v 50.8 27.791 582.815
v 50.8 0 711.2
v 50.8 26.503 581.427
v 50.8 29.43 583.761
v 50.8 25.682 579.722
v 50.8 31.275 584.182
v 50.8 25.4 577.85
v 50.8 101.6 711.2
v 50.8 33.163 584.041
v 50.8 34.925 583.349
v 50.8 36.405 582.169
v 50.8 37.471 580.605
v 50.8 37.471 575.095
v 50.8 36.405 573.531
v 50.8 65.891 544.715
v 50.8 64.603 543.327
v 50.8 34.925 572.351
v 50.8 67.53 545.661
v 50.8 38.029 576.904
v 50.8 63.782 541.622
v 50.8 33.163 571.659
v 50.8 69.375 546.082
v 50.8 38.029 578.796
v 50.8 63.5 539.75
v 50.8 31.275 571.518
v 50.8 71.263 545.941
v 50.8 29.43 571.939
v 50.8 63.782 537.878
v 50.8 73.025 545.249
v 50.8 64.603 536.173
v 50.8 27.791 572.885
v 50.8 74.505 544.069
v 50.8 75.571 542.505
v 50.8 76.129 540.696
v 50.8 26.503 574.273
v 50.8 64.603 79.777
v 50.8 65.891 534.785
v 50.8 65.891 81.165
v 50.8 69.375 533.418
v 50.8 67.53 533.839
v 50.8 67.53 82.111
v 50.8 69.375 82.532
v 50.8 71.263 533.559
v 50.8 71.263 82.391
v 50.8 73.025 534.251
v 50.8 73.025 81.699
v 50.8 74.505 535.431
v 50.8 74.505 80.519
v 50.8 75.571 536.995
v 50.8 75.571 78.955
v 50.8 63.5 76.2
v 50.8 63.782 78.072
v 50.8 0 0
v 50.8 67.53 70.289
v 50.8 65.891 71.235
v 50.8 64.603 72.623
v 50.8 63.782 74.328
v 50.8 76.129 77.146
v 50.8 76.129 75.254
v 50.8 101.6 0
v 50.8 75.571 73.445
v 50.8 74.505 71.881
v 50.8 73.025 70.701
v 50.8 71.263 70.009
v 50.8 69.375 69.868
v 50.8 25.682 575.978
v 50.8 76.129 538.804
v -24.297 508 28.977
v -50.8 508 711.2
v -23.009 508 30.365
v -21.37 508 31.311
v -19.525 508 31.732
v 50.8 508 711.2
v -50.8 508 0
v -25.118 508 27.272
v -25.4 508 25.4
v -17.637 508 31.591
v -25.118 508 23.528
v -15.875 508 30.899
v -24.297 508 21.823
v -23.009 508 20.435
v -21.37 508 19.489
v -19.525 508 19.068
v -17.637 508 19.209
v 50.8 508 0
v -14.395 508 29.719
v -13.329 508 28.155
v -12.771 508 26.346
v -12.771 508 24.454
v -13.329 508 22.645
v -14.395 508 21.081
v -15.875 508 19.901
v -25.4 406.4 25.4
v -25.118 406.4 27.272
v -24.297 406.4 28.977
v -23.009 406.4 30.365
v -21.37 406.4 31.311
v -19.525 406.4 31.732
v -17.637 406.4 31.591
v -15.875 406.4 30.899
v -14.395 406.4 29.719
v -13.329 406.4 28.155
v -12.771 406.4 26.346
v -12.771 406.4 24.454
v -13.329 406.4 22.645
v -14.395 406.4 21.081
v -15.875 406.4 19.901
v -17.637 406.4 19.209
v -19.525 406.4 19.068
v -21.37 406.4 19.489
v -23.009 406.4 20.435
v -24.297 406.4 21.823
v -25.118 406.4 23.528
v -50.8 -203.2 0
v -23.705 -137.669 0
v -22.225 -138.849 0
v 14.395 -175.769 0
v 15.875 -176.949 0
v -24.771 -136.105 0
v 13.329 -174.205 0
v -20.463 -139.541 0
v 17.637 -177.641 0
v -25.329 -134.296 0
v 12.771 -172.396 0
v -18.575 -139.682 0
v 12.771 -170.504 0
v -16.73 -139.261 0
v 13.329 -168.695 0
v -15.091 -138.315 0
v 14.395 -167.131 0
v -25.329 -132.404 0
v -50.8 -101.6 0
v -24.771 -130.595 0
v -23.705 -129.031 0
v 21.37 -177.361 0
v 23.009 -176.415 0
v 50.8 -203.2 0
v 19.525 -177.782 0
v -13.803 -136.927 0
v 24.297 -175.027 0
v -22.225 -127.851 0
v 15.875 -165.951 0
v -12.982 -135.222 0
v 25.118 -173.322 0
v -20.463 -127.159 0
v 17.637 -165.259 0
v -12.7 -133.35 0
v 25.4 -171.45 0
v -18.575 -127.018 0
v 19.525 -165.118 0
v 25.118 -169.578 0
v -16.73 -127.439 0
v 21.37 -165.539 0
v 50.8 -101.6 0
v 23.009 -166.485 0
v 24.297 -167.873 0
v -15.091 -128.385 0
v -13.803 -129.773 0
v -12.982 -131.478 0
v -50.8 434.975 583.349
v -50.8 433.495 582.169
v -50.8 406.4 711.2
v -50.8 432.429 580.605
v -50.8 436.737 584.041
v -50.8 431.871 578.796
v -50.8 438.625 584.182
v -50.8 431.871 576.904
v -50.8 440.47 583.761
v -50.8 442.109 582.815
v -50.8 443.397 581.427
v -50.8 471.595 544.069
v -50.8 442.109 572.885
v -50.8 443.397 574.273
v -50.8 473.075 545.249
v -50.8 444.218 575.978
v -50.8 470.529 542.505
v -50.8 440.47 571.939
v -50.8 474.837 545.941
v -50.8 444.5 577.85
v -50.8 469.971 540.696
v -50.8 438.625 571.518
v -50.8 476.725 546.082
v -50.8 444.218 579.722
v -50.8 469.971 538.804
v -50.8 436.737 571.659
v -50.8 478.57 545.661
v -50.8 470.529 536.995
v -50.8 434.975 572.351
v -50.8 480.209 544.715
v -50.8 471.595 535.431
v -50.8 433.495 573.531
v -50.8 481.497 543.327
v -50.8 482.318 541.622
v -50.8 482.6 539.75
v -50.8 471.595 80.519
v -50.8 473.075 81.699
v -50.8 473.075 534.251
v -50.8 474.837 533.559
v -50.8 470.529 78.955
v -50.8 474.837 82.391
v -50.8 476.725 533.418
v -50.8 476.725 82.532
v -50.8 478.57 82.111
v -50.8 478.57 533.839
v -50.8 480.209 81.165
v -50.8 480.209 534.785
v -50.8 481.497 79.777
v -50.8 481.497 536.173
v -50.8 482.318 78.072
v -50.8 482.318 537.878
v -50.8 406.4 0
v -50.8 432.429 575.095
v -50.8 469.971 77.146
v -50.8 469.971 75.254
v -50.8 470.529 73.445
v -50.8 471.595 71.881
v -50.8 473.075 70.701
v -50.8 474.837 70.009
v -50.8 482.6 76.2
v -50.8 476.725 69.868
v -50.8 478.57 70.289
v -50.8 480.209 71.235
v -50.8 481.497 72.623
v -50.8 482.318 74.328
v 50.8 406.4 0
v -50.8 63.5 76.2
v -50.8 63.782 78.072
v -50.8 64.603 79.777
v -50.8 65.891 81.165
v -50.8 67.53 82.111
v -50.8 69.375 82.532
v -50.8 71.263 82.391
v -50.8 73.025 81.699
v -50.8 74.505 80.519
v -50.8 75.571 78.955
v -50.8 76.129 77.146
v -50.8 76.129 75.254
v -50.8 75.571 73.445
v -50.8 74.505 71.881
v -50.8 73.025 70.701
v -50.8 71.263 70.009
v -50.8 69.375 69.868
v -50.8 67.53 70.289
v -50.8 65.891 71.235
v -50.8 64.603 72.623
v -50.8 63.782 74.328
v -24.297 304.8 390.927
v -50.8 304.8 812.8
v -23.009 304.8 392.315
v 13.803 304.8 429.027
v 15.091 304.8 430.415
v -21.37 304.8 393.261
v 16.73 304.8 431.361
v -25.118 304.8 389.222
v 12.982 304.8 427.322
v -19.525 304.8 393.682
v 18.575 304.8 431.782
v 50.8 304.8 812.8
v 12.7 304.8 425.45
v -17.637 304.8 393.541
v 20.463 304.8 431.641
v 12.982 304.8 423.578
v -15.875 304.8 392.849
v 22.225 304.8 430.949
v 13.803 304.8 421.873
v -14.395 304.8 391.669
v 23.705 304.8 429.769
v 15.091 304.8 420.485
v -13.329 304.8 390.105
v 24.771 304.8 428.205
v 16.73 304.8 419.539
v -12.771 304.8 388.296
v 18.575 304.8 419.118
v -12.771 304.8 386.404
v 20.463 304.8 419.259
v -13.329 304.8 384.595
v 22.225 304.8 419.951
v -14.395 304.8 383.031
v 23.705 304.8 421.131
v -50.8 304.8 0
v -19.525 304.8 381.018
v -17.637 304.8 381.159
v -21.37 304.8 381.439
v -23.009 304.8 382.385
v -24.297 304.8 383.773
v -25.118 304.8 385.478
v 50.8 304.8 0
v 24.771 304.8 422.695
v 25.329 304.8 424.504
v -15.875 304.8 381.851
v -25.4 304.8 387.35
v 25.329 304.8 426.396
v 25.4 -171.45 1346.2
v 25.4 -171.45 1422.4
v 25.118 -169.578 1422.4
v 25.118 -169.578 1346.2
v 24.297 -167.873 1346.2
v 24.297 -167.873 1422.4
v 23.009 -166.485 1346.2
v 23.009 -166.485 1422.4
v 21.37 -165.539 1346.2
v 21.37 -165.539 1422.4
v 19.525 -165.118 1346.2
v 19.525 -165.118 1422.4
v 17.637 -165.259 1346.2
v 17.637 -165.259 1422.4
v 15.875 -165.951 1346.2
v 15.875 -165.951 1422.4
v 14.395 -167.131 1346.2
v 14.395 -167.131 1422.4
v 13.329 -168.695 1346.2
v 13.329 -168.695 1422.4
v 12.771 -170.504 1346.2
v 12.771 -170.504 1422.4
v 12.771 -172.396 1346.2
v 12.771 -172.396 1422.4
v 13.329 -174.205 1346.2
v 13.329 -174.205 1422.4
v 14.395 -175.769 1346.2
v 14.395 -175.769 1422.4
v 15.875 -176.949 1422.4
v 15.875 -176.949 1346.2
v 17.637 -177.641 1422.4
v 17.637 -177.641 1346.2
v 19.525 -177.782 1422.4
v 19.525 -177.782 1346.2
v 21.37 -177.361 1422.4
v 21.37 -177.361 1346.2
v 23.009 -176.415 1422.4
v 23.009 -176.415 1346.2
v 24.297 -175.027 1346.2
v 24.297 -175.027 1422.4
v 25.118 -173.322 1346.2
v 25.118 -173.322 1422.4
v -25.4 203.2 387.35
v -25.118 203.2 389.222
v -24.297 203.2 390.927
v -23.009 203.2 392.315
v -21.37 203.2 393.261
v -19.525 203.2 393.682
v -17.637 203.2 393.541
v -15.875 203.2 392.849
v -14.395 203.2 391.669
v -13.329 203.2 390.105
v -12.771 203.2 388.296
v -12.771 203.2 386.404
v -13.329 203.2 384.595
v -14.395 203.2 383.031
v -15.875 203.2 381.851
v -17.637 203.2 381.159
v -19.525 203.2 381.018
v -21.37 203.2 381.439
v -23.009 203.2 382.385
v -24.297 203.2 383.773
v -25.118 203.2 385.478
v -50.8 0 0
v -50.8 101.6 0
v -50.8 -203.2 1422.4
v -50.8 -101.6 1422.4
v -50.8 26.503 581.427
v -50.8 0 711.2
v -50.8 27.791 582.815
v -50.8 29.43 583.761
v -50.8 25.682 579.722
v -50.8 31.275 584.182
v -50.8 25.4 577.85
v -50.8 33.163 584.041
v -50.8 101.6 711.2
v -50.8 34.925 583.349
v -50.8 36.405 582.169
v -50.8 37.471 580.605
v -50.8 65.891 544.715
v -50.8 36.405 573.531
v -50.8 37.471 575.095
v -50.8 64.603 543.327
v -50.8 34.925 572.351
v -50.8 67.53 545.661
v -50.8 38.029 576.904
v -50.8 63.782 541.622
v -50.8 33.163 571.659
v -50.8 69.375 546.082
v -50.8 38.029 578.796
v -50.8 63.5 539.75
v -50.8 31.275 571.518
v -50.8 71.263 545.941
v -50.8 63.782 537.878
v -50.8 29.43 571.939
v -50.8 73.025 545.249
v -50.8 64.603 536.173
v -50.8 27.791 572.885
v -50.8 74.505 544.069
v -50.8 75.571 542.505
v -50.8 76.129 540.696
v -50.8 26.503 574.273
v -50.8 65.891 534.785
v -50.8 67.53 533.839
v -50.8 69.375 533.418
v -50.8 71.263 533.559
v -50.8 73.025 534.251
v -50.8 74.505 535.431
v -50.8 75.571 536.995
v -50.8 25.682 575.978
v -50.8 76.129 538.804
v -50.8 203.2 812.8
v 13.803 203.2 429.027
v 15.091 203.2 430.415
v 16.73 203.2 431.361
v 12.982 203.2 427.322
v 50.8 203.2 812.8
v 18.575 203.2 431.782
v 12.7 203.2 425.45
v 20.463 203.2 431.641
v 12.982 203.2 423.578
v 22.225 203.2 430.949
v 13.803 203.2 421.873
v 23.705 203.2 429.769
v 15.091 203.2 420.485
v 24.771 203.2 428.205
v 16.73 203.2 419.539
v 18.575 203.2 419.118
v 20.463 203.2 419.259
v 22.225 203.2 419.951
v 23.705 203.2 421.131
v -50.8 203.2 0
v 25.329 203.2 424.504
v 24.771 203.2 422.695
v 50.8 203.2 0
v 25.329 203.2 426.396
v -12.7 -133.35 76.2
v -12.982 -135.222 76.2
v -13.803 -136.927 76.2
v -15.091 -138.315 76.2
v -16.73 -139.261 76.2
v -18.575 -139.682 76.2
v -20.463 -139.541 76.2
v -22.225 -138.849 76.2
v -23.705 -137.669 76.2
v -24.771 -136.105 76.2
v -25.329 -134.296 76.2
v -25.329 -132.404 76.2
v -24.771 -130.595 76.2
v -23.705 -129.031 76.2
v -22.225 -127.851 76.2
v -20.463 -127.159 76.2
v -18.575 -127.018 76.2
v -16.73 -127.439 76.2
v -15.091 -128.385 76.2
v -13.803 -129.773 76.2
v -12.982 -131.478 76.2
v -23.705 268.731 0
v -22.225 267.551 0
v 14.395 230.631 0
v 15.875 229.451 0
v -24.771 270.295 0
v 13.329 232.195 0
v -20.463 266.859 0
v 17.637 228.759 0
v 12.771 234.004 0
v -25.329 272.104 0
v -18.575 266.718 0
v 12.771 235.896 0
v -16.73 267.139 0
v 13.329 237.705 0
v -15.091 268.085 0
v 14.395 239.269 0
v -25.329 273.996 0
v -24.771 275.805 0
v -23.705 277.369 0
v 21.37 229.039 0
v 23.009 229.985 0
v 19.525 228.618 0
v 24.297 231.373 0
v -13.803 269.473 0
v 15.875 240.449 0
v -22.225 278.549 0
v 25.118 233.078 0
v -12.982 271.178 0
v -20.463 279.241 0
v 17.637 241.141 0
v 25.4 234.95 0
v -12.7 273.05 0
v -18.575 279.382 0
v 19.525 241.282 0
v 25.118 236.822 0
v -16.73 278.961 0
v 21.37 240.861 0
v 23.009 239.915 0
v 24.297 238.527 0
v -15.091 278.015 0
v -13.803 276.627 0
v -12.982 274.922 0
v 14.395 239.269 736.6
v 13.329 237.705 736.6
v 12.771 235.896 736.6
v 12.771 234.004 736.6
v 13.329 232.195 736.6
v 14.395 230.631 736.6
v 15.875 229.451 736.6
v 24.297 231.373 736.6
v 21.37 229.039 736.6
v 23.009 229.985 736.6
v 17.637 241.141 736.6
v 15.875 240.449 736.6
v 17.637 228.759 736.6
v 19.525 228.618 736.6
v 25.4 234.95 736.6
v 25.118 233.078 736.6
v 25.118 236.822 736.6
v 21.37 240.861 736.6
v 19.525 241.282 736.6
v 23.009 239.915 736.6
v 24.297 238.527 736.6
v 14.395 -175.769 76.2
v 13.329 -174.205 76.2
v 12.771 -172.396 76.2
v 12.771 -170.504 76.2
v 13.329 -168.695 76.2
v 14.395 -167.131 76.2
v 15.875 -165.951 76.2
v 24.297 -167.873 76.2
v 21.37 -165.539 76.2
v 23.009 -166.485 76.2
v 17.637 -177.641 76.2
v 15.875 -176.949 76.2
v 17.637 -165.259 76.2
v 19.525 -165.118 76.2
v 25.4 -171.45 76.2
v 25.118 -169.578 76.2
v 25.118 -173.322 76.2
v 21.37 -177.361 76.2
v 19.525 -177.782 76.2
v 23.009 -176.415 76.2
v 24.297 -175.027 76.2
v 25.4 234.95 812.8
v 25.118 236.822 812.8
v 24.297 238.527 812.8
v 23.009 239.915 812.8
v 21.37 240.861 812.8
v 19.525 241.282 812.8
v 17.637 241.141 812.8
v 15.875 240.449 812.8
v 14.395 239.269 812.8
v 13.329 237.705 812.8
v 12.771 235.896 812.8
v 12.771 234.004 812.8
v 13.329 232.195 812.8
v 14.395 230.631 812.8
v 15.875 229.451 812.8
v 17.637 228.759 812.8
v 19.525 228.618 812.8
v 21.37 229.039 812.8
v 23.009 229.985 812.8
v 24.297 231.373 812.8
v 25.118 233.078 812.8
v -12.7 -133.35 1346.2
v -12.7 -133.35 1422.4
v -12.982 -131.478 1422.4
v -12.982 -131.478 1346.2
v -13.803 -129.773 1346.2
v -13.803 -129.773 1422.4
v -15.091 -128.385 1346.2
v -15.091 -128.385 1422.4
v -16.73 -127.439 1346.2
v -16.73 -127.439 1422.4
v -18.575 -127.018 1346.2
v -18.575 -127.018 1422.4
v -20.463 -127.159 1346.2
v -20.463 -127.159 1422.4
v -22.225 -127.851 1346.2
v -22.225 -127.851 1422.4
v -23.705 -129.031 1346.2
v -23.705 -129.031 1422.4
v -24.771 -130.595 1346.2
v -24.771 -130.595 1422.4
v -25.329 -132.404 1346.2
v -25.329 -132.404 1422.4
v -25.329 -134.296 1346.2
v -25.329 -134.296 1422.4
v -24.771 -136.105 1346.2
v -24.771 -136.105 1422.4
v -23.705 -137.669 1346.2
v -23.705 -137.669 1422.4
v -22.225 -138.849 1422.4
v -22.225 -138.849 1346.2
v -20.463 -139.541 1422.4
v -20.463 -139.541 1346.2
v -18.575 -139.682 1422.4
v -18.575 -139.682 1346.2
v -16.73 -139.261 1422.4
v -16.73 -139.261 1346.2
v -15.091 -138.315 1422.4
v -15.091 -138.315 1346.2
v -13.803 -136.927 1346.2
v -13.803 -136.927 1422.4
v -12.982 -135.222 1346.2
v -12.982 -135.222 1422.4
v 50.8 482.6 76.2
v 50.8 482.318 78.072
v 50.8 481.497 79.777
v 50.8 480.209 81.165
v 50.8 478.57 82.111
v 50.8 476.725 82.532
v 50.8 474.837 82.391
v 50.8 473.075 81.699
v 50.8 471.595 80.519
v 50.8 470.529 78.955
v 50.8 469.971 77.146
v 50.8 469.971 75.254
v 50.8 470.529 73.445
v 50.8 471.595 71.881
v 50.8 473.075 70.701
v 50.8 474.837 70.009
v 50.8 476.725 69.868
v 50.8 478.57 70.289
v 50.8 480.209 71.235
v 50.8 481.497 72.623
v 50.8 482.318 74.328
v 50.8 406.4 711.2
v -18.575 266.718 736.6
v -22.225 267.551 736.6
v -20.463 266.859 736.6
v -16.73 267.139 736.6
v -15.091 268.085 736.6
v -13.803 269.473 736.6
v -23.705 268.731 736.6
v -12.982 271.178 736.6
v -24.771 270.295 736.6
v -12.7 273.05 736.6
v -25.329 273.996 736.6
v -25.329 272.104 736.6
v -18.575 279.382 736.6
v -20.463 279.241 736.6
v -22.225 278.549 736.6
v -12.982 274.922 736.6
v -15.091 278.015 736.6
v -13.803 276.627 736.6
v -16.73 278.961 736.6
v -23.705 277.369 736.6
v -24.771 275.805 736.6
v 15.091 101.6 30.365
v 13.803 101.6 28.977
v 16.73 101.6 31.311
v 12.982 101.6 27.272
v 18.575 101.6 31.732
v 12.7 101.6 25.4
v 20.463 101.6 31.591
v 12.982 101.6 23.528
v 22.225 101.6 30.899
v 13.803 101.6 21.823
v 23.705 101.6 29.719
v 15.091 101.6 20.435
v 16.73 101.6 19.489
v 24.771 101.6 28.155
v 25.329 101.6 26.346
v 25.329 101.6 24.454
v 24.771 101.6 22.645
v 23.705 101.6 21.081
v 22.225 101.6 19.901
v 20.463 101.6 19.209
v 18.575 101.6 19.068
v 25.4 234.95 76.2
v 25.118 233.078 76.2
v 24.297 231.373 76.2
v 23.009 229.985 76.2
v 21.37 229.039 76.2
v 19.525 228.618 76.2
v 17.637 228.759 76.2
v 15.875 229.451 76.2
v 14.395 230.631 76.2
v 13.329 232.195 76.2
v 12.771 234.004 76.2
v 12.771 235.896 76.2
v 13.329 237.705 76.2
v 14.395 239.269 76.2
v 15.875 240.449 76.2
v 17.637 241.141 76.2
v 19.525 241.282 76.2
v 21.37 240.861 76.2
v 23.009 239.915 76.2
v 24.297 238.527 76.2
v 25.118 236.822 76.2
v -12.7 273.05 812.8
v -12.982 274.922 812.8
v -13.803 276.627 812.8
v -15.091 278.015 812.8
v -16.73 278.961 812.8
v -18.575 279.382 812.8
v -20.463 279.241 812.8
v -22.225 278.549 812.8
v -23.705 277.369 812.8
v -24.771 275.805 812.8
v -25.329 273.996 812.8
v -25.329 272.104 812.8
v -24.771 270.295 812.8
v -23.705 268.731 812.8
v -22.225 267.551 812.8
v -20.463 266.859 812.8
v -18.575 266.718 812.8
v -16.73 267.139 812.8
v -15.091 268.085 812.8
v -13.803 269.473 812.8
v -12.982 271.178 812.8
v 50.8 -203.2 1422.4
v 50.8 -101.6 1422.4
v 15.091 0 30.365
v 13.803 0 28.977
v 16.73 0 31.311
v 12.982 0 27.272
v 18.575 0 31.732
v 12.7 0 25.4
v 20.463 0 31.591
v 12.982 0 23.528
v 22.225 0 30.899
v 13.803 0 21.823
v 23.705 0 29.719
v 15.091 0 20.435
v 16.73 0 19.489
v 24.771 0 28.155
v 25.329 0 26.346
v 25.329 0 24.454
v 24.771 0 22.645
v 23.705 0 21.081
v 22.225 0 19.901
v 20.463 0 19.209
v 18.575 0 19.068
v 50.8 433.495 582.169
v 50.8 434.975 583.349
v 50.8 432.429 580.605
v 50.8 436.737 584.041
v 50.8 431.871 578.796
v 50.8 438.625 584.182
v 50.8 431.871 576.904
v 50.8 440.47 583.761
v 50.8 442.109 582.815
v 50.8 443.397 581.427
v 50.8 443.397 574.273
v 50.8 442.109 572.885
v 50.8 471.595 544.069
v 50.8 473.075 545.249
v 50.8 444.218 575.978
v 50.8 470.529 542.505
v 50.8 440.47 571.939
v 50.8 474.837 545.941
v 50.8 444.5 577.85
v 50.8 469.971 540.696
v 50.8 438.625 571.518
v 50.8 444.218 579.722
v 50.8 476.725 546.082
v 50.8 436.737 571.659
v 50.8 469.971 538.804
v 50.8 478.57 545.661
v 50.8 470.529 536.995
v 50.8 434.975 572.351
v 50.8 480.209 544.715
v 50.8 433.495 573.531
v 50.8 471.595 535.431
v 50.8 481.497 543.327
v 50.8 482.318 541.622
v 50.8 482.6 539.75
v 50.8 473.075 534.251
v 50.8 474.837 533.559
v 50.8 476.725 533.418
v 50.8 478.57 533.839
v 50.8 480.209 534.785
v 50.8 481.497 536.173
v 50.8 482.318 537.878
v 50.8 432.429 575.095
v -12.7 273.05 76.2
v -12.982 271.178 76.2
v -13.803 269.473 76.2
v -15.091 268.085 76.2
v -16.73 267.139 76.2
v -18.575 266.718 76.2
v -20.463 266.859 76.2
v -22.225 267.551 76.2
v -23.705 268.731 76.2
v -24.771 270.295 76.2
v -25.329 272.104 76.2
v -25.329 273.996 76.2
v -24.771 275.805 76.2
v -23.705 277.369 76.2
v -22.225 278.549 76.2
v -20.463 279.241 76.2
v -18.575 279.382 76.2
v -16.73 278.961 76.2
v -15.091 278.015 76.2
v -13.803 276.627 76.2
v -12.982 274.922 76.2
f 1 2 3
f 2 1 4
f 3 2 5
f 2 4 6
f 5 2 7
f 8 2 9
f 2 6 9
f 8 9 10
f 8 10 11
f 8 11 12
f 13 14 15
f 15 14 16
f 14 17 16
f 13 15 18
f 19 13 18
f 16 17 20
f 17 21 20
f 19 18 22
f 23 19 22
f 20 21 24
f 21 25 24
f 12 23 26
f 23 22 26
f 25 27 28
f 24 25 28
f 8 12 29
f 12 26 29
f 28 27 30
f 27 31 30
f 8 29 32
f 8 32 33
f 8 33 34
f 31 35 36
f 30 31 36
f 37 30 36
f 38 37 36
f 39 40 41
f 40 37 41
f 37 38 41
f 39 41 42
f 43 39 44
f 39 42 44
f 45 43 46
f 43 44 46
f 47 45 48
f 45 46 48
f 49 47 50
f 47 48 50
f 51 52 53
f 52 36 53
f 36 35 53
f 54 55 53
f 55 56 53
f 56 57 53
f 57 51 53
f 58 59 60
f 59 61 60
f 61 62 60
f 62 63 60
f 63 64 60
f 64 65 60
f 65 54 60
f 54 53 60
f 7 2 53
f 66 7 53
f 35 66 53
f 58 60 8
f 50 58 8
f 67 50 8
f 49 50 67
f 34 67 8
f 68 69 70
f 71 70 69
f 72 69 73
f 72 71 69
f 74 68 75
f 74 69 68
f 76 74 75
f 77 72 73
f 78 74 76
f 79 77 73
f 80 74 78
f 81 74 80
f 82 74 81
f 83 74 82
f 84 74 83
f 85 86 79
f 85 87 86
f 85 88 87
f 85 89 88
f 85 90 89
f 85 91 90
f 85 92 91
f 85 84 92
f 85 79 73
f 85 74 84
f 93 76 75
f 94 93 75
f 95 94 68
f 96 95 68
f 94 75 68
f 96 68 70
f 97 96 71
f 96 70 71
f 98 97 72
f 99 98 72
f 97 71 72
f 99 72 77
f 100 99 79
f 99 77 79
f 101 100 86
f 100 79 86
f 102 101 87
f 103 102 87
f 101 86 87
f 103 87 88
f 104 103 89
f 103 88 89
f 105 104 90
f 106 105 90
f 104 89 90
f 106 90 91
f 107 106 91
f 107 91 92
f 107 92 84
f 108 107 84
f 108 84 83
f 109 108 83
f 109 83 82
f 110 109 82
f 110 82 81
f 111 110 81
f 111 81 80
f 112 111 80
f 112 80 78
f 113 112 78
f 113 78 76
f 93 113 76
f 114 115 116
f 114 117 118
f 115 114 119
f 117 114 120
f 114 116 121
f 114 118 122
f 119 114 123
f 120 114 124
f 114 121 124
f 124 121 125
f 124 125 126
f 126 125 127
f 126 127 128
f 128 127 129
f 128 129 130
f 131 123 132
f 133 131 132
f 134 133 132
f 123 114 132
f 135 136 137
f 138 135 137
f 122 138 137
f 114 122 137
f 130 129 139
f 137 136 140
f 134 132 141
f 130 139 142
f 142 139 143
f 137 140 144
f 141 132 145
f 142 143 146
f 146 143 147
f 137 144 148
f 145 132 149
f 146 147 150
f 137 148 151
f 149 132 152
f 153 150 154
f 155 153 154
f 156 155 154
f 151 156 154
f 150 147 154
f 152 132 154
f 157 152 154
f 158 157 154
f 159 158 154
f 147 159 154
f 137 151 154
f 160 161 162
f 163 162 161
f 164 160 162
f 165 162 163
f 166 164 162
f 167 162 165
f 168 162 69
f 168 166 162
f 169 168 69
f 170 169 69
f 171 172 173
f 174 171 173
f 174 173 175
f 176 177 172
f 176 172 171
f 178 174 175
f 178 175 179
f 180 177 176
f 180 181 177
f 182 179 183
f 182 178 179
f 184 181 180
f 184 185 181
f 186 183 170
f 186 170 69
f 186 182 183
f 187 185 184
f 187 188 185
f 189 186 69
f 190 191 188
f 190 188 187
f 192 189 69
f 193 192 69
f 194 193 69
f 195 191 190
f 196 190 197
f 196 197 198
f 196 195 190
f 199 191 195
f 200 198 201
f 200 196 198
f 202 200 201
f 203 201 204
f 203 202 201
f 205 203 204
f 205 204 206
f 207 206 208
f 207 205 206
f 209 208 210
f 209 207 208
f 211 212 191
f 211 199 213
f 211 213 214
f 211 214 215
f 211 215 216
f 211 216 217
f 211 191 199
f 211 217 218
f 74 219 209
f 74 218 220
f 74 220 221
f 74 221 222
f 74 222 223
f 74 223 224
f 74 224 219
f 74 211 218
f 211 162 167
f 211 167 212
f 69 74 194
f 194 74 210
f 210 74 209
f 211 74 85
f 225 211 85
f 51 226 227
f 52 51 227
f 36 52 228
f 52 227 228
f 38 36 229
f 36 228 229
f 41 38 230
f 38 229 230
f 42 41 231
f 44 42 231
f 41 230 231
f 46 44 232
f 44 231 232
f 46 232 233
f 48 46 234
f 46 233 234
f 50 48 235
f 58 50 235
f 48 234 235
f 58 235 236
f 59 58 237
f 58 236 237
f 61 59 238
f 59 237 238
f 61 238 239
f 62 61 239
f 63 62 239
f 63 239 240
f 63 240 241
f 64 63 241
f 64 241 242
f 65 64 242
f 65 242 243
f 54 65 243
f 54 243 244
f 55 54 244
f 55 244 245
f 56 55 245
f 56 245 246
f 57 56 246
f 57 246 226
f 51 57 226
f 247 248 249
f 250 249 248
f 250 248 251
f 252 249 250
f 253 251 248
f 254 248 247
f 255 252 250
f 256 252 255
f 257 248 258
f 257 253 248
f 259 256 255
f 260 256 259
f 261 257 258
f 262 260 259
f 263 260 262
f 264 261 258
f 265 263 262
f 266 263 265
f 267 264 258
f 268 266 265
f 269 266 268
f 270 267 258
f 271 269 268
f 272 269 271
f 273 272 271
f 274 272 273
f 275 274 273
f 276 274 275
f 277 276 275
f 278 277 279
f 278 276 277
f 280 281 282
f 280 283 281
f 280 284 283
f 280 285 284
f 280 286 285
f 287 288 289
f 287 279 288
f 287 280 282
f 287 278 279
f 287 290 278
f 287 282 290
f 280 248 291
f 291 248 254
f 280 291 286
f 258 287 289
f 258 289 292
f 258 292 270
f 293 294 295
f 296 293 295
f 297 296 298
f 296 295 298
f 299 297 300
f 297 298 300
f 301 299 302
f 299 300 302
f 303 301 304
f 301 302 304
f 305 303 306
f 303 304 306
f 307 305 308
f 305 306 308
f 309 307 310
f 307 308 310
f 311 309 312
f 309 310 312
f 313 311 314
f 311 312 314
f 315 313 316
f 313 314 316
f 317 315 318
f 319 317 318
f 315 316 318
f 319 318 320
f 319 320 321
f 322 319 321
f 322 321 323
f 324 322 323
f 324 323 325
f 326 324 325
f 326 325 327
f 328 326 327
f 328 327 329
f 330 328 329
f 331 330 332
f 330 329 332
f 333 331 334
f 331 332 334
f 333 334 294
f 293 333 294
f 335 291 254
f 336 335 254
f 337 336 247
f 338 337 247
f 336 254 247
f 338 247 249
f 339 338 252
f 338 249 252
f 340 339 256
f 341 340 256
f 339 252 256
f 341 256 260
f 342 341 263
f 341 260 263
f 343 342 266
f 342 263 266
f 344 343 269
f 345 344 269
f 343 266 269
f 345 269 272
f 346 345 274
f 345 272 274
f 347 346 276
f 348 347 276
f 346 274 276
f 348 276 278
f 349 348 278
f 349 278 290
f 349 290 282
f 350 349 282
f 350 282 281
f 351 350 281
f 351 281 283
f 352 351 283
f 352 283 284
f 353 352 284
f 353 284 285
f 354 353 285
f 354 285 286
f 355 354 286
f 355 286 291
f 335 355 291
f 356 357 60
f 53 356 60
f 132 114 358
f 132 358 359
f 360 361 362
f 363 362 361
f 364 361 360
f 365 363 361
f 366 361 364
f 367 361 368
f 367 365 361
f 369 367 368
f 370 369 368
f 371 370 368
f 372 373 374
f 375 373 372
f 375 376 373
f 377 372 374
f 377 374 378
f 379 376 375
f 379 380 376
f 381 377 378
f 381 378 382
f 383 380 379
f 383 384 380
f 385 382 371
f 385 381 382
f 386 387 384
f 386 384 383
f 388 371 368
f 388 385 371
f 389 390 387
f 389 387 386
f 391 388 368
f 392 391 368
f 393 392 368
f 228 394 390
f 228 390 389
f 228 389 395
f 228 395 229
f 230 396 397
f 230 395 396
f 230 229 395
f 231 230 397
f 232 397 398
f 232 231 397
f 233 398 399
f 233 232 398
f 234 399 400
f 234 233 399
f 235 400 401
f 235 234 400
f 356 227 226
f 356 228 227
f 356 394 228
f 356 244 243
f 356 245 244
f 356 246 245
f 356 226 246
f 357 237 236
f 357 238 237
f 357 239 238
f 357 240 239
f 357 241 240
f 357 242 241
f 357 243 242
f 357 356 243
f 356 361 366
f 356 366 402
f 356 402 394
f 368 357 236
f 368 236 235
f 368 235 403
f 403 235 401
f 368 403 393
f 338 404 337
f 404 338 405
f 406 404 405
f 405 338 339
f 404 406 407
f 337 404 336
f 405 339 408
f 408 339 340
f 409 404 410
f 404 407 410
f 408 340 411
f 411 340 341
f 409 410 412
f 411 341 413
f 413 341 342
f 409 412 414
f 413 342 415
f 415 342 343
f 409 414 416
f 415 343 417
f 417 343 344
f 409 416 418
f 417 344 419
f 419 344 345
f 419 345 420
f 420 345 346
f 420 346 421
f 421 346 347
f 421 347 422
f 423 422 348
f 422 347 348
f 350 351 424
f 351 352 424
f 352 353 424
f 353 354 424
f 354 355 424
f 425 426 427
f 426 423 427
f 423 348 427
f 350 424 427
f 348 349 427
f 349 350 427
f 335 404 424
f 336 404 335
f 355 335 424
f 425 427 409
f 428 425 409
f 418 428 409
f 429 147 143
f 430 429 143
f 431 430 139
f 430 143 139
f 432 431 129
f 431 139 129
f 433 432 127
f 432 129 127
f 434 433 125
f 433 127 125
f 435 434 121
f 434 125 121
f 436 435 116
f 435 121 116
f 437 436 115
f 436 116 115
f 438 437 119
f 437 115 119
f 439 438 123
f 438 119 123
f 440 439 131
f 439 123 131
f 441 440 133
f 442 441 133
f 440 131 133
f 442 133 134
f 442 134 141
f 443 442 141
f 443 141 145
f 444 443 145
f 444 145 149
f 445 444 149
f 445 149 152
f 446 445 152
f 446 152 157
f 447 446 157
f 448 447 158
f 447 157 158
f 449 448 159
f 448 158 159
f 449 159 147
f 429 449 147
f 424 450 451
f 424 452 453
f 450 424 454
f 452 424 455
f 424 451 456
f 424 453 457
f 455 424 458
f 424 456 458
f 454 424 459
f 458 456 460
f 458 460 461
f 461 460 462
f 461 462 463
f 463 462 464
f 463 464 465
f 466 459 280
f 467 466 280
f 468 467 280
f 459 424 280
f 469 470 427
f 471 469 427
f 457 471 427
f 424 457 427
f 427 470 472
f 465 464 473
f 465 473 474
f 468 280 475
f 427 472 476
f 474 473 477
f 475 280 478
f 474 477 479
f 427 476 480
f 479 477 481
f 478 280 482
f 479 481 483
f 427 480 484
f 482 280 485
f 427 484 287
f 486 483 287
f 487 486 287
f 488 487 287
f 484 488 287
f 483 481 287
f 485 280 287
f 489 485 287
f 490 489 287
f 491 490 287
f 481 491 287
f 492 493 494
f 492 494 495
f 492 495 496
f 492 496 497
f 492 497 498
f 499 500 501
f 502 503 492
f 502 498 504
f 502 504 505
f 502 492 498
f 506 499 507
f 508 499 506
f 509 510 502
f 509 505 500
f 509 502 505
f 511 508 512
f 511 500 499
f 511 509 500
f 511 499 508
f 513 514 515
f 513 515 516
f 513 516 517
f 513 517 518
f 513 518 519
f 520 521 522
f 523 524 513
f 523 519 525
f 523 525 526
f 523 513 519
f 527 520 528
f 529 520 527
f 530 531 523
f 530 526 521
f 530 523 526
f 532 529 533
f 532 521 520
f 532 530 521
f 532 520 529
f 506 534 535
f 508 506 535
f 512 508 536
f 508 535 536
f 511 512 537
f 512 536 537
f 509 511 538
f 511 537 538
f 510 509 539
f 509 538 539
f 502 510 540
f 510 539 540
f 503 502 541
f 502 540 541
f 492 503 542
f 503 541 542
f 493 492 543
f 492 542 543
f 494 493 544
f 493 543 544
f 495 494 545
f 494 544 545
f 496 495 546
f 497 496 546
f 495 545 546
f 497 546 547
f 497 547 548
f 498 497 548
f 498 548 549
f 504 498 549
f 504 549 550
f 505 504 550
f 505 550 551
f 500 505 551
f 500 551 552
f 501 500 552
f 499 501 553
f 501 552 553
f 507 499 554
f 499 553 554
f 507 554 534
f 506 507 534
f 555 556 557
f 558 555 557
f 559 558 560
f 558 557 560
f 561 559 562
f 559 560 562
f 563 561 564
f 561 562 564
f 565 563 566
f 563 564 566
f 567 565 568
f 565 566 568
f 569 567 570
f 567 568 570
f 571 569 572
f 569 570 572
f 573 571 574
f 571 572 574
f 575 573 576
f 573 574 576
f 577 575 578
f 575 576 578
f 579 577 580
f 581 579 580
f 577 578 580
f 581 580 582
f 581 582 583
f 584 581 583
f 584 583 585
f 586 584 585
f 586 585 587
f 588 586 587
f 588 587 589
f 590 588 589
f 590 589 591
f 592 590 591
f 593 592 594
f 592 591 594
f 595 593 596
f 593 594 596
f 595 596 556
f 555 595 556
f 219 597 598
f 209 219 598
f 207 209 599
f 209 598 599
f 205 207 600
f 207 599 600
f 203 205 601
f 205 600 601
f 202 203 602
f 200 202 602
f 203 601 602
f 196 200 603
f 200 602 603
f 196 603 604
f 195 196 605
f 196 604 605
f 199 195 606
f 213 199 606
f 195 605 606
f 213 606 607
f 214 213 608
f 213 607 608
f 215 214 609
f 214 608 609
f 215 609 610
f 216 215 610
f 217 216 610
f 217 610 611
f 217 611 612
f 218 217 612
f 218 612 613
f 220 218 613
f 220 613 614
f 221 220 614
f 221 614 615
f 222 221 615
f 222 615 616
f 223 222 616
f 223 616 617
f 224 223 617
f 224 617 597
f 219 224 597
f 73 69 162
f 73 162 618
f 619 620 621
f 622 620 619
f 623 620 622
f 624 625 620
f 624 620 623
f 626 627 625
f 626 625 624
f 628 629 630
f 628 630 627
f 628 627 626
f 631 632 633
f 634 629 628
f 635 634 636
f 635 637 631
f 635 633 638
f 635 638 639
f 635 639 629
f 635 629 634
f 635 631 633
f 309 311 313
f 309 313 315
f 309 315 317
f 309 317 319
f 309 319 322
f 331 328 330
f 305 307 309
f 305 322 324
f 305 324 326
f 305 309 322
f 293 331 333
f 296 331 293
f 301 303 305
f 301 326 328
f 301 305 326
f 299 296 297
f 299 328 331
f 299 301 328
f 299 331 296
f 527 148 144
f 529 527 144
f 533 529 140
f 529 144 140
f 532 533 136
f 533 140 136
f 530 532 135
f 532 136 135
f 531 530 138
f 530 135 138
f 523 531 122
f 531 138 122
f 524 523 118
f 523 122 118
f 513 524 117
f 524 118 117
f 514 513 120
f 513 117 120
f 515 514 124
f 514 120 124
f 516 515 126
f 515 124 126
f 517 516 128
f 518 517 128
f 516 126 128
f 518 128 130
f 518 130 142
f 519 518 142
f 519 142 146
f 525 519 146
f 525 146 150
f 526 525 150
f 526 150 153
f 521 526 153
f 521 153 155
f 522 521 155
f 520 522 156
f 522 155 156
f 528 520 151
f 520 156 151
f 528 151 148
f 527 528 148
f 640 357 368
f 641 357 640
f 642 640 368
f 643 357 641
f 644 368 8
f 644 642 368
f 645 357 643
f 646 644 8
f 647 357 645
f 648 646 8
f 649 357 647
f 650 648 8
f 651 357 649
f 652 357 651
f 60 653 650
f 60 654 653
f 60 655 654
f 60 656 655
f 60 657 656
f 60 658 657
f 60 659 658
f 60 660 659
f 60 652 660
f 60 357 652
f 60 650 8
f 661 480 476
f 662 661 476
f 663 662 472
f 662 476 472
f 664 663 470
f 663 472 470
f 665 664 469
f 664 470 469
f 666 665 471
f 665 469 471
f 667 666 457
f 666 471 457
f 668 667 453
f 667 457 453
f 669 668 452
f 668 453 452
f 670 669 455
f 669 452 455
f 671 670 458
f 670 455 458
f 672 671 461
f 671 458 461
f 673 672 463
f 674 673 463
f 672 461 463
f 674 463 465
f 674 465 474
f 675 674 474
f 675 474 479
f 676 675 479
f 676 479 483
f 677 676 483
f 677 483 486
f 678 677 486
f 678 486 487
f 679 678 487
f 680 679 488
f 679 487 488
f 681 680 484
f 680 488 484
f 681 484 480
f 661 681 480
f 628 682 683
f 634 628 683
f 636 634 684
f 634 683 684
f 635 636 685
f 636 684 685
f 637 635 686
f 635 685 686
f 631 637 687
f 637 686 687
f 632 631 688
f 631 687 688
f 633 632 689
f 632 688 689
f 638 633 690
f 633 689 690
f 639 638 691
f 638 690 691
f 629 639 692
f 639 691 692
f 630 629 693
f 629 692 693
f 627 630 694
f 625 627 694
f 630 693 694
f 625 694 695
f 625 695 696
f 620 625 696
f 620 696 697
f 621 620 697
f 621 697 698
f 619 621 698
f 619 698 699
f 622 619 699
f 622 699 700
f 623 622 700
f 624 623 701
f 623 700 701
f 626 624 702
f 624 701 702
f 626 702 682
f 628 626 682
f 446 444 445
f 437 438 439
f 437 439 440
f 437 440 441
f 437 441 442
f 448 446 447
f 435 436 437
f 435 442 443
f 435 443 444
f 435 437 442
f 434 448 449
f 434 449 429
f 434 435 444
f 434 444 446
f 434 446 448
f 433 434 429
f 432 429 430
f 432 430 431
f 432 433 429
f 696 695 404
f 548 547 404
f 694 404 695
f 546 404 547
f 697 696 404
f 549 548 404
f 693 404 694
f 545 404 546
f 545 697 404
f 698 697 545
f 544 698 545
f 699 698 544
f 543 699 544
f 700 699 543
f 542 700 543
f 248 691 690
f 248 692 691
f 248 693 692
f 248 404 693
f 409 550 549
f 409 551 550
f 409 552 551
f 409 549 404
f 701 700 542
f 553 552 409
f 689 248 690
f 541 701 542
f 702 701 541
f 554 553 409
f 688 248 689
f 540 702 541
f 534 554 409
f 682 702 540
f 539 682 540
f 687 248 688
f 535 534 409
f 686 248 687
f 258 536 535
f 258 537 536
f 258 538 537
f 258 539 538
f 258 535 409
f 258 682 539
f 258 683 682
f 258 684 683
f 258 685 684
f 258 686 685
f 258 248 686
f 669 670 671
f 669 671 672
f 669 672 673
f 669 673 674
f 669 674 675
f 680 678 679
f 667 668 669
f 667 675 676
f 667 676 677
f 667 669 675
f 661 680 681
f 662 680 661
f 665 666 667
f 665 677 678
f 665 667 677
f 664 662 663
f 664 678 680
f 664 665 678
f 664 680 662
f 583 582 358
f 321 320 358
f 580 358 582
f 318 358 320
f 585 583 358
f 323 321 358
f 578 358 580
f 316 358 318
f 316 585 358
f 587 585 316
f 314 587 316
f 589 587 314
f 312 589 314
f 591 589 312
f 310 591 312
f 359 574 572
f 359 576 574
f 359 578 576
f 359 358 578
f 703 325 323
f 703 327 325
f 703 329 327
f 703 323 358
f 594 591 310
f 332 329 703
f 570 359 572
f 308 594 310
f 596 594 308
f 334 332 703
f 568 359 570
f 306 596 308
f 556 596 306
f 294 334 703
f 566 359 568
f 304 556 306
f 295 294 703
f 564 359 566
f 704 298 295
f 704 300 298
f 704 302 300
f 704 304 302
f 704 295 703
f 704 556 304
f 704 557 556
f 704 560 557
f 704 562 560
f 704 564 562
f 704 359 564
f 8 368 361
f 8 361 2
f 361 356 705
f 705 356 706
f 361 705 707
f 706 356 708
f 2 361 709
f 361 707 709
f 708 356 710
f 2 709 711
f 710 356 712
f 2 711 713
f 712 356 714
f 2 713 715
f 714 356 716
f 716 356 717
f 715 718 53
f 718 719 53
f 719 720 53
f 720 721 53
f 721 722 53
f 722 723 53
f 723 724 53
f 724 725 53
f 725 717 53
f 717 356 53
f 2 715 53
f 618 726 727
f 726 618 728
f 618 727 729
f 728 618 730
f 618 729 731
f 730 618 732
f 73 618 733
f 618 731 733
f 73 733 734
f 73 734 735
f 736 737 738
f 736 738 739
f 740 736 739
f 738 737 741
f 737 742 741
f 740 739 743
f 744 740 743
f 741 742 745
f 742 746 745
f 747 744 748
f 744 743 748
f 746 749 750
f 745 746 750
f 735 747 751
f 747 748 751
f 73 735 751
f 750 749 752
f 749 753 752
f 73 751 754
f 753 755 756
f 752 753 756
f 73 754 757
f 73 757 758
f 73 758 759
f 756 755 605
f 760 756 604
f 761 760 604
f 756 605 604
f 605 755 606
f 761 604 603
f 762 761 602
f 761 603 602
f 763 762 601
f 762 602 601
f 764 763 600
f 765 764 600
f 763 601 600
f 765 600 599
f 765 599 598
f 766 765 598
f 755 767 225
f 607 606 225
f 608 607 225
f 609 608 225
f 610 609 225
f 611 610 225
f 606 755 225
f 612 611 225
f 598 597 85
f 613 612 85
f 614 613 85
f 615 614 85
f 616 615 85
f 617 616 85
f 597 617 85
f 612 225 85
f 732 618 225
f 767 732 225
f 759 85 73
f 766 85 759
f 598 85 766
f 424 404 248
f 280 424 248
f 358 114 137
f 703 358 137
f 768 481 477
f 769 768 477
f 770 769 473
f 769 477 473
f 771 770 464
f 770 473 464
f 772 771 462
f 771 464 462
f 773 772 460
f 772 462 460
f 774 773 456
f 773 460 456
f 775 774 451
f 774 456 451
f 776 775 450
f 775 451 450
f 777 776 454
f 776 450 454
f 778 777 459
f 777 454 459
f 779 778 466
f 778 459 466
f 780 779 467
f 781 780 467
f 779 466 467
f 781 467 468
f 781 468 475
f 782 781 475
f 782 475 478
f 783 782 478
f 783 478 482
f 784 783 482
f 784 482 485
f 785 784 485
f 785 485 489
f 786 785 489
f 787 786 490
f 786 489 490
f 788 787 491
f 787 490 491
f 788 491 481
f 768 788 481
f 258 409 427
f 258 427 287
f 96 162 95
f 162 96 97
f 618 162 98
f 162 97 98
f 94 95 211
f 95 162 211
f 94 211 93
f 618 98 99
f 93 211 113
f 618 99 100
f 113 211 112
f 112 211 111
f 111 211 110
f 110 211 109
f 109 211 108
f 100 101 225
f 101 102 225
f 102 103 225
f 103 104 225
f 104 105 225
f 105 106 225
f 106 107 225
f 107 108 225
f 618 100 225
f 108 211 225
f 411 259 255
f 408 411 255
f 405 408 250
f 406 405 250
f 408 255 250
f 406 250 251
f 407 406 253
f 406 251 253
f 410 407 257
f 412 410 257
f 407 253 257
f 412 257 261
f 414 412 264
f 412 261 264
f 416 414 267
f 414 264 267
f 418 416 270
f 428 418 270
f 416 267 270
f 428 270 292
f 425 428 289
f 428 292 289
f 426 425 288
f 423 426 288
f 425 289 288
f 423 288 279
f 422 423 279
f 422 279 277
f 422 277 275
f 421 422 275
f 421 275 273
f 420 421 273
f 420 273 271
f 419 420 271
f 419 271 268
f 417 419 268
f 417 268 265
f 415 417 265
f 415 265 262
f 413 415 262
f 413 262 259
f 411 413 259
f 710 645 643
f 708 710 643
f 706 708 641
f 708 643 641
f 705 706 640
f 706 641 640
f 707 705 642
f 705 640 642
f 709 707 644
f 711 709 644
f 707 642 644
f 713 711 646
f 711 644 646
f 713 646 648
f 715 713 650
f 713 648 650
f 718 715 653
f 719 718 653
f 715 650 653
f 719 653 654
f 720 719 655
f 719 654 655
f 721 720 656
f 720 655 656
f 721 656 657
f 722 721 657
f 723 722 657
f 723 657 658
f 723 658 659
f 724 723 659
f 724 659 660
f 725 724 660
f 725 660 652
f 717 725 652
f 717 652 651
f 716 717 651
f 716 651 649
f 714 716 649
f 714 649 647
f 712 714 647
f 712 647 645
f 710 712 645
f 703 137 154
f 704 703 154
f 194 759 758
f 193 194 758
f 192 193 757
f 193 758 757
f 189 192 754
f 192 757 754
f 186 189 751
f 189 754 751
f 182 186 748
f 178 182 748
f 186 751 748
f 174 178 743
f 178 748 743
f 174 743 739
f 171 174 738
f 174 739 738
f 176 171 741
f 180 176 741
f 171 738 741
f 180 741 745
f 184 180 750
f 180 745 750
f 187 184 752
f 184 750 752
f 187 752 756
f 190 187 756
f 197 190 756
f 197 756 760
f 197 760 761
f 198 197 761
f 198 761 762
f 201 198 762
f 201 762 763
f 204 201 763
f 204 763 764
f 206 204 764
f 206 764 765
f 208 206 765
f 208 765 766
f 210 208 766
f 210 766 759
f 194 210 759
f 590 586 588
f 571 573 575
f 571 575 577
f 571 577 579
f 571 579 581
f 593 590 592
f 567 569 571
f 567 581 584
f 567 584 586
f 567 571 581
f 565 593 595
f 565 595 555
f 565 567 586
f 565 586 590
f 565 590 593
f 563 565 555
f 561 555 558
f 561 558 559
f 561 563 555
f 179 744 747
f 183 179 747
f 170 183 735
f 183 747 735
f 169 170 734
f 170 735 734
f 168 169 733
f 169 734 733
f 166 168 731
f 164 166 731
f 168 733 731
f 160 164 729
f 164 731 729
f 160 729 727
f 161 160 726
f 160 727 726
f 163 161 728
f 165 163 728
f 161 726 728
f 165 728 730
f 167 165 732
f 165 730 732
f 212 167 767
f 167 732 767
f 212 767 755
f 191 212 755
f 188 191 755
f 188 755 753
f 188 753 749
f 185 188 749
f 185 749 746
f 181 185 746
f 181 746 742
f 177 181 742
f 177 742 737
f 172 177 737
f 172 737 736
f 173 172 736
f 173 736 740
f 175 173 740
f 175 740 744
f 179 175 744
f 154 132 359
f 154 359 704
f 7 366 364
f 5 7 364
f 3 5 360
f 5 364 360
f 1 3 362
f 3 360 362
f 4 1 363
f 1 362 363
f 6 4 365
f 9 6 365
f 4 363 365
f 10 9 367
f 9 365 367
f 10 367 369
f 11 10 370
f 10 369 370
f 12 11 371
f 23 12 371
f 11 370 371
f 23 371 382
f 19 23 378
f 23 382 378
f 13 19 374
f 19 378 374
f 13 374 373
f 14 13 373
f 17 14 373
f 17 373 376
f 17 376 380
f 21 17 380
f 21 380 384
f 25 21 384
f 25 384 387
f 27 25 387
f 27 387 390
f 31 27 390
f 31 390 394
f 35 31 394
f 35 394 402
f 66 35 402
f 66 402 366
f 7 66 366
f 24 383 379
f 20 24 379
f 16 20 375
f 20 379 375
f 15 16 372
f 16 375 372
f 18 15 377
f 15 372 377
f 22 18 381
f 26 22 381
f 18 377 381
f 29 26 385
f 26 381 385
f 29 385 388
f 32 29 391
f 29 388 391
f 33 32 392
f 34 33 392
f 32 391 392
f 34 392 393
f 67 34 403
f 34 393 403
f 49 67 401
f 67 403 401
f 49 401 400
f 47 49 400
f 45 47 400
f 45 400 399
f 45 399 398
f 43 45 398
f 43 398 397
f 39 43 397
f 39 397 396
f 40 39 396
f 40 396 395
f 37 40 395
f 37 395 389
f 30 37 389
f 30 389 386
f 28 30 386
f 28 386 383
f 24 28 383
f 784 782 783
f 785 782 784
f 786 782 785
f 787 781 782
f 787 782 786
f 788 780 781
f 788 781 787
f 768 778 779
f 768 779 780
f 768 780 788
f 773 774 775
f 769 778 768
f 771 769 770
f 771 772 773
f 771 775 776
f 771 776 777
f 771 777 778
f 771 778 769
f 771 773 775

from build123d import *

# Parameters (mm, degrees)
F0_W      = 101.6
F0_H      = 101.6
F1_DEPTH  = 711.2
F2_W      = 101.6
F2_H      = 101.6
F3_DEPTH  = 1422.4
F4_W      = 101.6
F4_H      = 101.6
F5_DEPTH  = 812.8
F6_R      = 6.35
F7_DEPTH  = 304.801
F8_R      = 6.35
F9_DEPTH  = 101.601
F10_R     = 6.35
F11_DEPTH = 101.601
F12_R     = 6.35
F13_DEPTH = 76.2
F14_R     = 6.35
F15_DEPTH = 508.001
F16_R     = 6.35
F17_DEPTH = 76.2
F18_R     = 6.35
F19_DEPTH = 76.2
F20_R     = 6.35
F21_DEPTH = 76.2
F22_W     = 101.6
F22_H     = 101.6
F23_DEPTH = 711.2
F24_R     = 6.35
F25_DEPTH = 101.601
F26_R     = 6.35
F27_DEPTH = 711.201
F28_R     = 6.35
F29_DEPTH = 101.601


with BuildPart() as f1:
    # F0 (on Top) → F1 (new body)
    with BuildSketch(Plane.XY):
        with Locations((0, 50.8)):
            Rectangle(F0_W, F0_H)
    extrude(amount=F1_DEPTH)

    # F6 (on face) → F7 (cut, through all)
    with BuildSketch(Plane(origin=(0, 101.6, 0), x_dir=(-1, 0, 0), z_dir=(0, 1, 0))):
        with Locations((-19.05, 25.4)):
            Circle(F6_R)
    extrude(amount=-F7_DEPTH, mode=Mode.SUBTRACT)

    # F8 (on face) → F9 (cut, through all)
    with BuildSketch(Plane(origin=(-50.8, 0, 0), x_dir=(0, -1, 0), z_dir=(-1, 0, 0))):
        with Locations((-69.85, 76.2)):
            Circle(F8_R)
    extrude(amount=-F9_DEPTH, mode=Mode.SUBTRACT)

    # F10 (on face) → F11 (cut, through all)
    with BuildSketch(Plane(origin=(-50.8, 0, 0), x_dir=(0, -1, 0), z_dir=(-1, 0, 0))):
        with Locations((-31.75, 577.85)):
            Circle(F10_R)
        with Locations((-69.85, 539.75)):
            Circle(F10_R)
    extrude(amount=-F11_DEPTH, mode=Mode.SUBTRACT)


with BuildPart() as f3:
    # F2 (on Top) → F3 (new body)
    with BuildSketch(Plane.XY):
        with Locations((0, -152.4)):
            Rectangle(F2_W, F2_H)
    extrude(amount=F3_DEPTH)

    # F12 (on face) → F13 (cut)
    with BuildSketch(Plane(origin=(0, 0, 0), x_dir=(1, 0, 0), z_dir=(0, 0, -1))):
        with Locations((19.05, 171.45)):
            Circle(F12_R)
        with Locations((-19.05, 133.35)):
            Circle(F12_R)
    extrude(amount=-F13_DEPTH, mode=Mode.SUBTRACT)

    # F16 (on face) → F17 (cut)
    with BuildSketch(Plane.XY.offset(1422.4)):
        with Locations((-19.05, -133.35)):
            Circle(F16_R)
        with Locations((19.05, -171.45)):
            Circle(F16_R)
    extrude(amount=-F17_DEPTH, mode=Mode.SUBTRACT)


with BuildPart() as f5:
    # F4 (on Top) → F5 (new body)
    with BuildSketch(Plane.XY):
        with Locations((0, 254)):
            Rectangle(F4_W, F4_H)
    extrude(amount=F5_DEPTH)

    # F14 (on face) → F15 (cut, through all)
    with BuildSketch(Plane(origin=(0, 304.8, 0), x_dir=(-1, 0, 0), z_dir=(0, 1, 0))):
        with Locations((19.05, 387.35)):
            Circle(F14_R)
        with Locations((-19.05, 425.45)):
            Circle(F14_R)
    extrude(amount=-F15_DEPTH, mode=Mode.SUBTRACT)

    # F18 (on face) → F19 (cut)
    with BuildSketch(Plane.XY.offset(812.8)):
        with Locations((-19.05, 273.05)):
            Circle(F18_R)
        with Locations((19.05, 234.95)):
            Circle(F18_R)
    extrude(amount=-F19_DEPTH, mode=Mode.SUBTRACT)

    # F20 (on face) → F21 (cut)
    with BuildSketch(Plane(origin=(0, 0, 0), x_dir=(1, 0, 0), z_dir=(0, 0, -1))):
        with Locations((19.05, -234.95)):
            Circle(F20_R)
        with Locations((-19.05, -273.05)):
            Circle(F20_R)
    extrude(amount=-F21_DEPTH, mode=Mode.SUBTRACT)


with BuildPart() as f23:
    # F22 (on Top) → F23 (new body)
    with BuildSketch(Plane.XY):
        with Locations((0, 457.2)):
            Rectangle(F22_W, F22_H)
    extrude(amount=F23_DEPTH)

    # F24 (on face) → F25 (cut, through all)
    with BuildSketch(Plane.YZ.offset(50.8)):
        with Locations((476.25, 539.75)):
            Circle(F24_R)
        with Locations((438.15, 577.85)):
            Circle(F24_R)
    extrude(amount=-F25_DEPTH, mode=Mode.SUBTRACT)

    # F26 (on face) → F27 (cut, through all)
    with BuildSketch(Plane(origin=(0, 508, 0), x_dir=(-1, 0, 0), z_dir=(0, 1, 0))):
        with Locations((19.05, 25.4)):
            Circle(F26_R)
    extrude(amount=-F27_DEPTH, mode=Mode.SUBTRACT)

    # F28 (on face) → F29 (cut, through all)
    with BuildSketch(Plane.YZ.offset(50.8)):
        with Locations((476.25, 76.2)):
            Circle(F28_R)
    extrude(amount=-F29_DEPTH, mode=Mode.SUBTRACT)


solid = Compound([f1.part, f3.part, f5.part, f23.part])
